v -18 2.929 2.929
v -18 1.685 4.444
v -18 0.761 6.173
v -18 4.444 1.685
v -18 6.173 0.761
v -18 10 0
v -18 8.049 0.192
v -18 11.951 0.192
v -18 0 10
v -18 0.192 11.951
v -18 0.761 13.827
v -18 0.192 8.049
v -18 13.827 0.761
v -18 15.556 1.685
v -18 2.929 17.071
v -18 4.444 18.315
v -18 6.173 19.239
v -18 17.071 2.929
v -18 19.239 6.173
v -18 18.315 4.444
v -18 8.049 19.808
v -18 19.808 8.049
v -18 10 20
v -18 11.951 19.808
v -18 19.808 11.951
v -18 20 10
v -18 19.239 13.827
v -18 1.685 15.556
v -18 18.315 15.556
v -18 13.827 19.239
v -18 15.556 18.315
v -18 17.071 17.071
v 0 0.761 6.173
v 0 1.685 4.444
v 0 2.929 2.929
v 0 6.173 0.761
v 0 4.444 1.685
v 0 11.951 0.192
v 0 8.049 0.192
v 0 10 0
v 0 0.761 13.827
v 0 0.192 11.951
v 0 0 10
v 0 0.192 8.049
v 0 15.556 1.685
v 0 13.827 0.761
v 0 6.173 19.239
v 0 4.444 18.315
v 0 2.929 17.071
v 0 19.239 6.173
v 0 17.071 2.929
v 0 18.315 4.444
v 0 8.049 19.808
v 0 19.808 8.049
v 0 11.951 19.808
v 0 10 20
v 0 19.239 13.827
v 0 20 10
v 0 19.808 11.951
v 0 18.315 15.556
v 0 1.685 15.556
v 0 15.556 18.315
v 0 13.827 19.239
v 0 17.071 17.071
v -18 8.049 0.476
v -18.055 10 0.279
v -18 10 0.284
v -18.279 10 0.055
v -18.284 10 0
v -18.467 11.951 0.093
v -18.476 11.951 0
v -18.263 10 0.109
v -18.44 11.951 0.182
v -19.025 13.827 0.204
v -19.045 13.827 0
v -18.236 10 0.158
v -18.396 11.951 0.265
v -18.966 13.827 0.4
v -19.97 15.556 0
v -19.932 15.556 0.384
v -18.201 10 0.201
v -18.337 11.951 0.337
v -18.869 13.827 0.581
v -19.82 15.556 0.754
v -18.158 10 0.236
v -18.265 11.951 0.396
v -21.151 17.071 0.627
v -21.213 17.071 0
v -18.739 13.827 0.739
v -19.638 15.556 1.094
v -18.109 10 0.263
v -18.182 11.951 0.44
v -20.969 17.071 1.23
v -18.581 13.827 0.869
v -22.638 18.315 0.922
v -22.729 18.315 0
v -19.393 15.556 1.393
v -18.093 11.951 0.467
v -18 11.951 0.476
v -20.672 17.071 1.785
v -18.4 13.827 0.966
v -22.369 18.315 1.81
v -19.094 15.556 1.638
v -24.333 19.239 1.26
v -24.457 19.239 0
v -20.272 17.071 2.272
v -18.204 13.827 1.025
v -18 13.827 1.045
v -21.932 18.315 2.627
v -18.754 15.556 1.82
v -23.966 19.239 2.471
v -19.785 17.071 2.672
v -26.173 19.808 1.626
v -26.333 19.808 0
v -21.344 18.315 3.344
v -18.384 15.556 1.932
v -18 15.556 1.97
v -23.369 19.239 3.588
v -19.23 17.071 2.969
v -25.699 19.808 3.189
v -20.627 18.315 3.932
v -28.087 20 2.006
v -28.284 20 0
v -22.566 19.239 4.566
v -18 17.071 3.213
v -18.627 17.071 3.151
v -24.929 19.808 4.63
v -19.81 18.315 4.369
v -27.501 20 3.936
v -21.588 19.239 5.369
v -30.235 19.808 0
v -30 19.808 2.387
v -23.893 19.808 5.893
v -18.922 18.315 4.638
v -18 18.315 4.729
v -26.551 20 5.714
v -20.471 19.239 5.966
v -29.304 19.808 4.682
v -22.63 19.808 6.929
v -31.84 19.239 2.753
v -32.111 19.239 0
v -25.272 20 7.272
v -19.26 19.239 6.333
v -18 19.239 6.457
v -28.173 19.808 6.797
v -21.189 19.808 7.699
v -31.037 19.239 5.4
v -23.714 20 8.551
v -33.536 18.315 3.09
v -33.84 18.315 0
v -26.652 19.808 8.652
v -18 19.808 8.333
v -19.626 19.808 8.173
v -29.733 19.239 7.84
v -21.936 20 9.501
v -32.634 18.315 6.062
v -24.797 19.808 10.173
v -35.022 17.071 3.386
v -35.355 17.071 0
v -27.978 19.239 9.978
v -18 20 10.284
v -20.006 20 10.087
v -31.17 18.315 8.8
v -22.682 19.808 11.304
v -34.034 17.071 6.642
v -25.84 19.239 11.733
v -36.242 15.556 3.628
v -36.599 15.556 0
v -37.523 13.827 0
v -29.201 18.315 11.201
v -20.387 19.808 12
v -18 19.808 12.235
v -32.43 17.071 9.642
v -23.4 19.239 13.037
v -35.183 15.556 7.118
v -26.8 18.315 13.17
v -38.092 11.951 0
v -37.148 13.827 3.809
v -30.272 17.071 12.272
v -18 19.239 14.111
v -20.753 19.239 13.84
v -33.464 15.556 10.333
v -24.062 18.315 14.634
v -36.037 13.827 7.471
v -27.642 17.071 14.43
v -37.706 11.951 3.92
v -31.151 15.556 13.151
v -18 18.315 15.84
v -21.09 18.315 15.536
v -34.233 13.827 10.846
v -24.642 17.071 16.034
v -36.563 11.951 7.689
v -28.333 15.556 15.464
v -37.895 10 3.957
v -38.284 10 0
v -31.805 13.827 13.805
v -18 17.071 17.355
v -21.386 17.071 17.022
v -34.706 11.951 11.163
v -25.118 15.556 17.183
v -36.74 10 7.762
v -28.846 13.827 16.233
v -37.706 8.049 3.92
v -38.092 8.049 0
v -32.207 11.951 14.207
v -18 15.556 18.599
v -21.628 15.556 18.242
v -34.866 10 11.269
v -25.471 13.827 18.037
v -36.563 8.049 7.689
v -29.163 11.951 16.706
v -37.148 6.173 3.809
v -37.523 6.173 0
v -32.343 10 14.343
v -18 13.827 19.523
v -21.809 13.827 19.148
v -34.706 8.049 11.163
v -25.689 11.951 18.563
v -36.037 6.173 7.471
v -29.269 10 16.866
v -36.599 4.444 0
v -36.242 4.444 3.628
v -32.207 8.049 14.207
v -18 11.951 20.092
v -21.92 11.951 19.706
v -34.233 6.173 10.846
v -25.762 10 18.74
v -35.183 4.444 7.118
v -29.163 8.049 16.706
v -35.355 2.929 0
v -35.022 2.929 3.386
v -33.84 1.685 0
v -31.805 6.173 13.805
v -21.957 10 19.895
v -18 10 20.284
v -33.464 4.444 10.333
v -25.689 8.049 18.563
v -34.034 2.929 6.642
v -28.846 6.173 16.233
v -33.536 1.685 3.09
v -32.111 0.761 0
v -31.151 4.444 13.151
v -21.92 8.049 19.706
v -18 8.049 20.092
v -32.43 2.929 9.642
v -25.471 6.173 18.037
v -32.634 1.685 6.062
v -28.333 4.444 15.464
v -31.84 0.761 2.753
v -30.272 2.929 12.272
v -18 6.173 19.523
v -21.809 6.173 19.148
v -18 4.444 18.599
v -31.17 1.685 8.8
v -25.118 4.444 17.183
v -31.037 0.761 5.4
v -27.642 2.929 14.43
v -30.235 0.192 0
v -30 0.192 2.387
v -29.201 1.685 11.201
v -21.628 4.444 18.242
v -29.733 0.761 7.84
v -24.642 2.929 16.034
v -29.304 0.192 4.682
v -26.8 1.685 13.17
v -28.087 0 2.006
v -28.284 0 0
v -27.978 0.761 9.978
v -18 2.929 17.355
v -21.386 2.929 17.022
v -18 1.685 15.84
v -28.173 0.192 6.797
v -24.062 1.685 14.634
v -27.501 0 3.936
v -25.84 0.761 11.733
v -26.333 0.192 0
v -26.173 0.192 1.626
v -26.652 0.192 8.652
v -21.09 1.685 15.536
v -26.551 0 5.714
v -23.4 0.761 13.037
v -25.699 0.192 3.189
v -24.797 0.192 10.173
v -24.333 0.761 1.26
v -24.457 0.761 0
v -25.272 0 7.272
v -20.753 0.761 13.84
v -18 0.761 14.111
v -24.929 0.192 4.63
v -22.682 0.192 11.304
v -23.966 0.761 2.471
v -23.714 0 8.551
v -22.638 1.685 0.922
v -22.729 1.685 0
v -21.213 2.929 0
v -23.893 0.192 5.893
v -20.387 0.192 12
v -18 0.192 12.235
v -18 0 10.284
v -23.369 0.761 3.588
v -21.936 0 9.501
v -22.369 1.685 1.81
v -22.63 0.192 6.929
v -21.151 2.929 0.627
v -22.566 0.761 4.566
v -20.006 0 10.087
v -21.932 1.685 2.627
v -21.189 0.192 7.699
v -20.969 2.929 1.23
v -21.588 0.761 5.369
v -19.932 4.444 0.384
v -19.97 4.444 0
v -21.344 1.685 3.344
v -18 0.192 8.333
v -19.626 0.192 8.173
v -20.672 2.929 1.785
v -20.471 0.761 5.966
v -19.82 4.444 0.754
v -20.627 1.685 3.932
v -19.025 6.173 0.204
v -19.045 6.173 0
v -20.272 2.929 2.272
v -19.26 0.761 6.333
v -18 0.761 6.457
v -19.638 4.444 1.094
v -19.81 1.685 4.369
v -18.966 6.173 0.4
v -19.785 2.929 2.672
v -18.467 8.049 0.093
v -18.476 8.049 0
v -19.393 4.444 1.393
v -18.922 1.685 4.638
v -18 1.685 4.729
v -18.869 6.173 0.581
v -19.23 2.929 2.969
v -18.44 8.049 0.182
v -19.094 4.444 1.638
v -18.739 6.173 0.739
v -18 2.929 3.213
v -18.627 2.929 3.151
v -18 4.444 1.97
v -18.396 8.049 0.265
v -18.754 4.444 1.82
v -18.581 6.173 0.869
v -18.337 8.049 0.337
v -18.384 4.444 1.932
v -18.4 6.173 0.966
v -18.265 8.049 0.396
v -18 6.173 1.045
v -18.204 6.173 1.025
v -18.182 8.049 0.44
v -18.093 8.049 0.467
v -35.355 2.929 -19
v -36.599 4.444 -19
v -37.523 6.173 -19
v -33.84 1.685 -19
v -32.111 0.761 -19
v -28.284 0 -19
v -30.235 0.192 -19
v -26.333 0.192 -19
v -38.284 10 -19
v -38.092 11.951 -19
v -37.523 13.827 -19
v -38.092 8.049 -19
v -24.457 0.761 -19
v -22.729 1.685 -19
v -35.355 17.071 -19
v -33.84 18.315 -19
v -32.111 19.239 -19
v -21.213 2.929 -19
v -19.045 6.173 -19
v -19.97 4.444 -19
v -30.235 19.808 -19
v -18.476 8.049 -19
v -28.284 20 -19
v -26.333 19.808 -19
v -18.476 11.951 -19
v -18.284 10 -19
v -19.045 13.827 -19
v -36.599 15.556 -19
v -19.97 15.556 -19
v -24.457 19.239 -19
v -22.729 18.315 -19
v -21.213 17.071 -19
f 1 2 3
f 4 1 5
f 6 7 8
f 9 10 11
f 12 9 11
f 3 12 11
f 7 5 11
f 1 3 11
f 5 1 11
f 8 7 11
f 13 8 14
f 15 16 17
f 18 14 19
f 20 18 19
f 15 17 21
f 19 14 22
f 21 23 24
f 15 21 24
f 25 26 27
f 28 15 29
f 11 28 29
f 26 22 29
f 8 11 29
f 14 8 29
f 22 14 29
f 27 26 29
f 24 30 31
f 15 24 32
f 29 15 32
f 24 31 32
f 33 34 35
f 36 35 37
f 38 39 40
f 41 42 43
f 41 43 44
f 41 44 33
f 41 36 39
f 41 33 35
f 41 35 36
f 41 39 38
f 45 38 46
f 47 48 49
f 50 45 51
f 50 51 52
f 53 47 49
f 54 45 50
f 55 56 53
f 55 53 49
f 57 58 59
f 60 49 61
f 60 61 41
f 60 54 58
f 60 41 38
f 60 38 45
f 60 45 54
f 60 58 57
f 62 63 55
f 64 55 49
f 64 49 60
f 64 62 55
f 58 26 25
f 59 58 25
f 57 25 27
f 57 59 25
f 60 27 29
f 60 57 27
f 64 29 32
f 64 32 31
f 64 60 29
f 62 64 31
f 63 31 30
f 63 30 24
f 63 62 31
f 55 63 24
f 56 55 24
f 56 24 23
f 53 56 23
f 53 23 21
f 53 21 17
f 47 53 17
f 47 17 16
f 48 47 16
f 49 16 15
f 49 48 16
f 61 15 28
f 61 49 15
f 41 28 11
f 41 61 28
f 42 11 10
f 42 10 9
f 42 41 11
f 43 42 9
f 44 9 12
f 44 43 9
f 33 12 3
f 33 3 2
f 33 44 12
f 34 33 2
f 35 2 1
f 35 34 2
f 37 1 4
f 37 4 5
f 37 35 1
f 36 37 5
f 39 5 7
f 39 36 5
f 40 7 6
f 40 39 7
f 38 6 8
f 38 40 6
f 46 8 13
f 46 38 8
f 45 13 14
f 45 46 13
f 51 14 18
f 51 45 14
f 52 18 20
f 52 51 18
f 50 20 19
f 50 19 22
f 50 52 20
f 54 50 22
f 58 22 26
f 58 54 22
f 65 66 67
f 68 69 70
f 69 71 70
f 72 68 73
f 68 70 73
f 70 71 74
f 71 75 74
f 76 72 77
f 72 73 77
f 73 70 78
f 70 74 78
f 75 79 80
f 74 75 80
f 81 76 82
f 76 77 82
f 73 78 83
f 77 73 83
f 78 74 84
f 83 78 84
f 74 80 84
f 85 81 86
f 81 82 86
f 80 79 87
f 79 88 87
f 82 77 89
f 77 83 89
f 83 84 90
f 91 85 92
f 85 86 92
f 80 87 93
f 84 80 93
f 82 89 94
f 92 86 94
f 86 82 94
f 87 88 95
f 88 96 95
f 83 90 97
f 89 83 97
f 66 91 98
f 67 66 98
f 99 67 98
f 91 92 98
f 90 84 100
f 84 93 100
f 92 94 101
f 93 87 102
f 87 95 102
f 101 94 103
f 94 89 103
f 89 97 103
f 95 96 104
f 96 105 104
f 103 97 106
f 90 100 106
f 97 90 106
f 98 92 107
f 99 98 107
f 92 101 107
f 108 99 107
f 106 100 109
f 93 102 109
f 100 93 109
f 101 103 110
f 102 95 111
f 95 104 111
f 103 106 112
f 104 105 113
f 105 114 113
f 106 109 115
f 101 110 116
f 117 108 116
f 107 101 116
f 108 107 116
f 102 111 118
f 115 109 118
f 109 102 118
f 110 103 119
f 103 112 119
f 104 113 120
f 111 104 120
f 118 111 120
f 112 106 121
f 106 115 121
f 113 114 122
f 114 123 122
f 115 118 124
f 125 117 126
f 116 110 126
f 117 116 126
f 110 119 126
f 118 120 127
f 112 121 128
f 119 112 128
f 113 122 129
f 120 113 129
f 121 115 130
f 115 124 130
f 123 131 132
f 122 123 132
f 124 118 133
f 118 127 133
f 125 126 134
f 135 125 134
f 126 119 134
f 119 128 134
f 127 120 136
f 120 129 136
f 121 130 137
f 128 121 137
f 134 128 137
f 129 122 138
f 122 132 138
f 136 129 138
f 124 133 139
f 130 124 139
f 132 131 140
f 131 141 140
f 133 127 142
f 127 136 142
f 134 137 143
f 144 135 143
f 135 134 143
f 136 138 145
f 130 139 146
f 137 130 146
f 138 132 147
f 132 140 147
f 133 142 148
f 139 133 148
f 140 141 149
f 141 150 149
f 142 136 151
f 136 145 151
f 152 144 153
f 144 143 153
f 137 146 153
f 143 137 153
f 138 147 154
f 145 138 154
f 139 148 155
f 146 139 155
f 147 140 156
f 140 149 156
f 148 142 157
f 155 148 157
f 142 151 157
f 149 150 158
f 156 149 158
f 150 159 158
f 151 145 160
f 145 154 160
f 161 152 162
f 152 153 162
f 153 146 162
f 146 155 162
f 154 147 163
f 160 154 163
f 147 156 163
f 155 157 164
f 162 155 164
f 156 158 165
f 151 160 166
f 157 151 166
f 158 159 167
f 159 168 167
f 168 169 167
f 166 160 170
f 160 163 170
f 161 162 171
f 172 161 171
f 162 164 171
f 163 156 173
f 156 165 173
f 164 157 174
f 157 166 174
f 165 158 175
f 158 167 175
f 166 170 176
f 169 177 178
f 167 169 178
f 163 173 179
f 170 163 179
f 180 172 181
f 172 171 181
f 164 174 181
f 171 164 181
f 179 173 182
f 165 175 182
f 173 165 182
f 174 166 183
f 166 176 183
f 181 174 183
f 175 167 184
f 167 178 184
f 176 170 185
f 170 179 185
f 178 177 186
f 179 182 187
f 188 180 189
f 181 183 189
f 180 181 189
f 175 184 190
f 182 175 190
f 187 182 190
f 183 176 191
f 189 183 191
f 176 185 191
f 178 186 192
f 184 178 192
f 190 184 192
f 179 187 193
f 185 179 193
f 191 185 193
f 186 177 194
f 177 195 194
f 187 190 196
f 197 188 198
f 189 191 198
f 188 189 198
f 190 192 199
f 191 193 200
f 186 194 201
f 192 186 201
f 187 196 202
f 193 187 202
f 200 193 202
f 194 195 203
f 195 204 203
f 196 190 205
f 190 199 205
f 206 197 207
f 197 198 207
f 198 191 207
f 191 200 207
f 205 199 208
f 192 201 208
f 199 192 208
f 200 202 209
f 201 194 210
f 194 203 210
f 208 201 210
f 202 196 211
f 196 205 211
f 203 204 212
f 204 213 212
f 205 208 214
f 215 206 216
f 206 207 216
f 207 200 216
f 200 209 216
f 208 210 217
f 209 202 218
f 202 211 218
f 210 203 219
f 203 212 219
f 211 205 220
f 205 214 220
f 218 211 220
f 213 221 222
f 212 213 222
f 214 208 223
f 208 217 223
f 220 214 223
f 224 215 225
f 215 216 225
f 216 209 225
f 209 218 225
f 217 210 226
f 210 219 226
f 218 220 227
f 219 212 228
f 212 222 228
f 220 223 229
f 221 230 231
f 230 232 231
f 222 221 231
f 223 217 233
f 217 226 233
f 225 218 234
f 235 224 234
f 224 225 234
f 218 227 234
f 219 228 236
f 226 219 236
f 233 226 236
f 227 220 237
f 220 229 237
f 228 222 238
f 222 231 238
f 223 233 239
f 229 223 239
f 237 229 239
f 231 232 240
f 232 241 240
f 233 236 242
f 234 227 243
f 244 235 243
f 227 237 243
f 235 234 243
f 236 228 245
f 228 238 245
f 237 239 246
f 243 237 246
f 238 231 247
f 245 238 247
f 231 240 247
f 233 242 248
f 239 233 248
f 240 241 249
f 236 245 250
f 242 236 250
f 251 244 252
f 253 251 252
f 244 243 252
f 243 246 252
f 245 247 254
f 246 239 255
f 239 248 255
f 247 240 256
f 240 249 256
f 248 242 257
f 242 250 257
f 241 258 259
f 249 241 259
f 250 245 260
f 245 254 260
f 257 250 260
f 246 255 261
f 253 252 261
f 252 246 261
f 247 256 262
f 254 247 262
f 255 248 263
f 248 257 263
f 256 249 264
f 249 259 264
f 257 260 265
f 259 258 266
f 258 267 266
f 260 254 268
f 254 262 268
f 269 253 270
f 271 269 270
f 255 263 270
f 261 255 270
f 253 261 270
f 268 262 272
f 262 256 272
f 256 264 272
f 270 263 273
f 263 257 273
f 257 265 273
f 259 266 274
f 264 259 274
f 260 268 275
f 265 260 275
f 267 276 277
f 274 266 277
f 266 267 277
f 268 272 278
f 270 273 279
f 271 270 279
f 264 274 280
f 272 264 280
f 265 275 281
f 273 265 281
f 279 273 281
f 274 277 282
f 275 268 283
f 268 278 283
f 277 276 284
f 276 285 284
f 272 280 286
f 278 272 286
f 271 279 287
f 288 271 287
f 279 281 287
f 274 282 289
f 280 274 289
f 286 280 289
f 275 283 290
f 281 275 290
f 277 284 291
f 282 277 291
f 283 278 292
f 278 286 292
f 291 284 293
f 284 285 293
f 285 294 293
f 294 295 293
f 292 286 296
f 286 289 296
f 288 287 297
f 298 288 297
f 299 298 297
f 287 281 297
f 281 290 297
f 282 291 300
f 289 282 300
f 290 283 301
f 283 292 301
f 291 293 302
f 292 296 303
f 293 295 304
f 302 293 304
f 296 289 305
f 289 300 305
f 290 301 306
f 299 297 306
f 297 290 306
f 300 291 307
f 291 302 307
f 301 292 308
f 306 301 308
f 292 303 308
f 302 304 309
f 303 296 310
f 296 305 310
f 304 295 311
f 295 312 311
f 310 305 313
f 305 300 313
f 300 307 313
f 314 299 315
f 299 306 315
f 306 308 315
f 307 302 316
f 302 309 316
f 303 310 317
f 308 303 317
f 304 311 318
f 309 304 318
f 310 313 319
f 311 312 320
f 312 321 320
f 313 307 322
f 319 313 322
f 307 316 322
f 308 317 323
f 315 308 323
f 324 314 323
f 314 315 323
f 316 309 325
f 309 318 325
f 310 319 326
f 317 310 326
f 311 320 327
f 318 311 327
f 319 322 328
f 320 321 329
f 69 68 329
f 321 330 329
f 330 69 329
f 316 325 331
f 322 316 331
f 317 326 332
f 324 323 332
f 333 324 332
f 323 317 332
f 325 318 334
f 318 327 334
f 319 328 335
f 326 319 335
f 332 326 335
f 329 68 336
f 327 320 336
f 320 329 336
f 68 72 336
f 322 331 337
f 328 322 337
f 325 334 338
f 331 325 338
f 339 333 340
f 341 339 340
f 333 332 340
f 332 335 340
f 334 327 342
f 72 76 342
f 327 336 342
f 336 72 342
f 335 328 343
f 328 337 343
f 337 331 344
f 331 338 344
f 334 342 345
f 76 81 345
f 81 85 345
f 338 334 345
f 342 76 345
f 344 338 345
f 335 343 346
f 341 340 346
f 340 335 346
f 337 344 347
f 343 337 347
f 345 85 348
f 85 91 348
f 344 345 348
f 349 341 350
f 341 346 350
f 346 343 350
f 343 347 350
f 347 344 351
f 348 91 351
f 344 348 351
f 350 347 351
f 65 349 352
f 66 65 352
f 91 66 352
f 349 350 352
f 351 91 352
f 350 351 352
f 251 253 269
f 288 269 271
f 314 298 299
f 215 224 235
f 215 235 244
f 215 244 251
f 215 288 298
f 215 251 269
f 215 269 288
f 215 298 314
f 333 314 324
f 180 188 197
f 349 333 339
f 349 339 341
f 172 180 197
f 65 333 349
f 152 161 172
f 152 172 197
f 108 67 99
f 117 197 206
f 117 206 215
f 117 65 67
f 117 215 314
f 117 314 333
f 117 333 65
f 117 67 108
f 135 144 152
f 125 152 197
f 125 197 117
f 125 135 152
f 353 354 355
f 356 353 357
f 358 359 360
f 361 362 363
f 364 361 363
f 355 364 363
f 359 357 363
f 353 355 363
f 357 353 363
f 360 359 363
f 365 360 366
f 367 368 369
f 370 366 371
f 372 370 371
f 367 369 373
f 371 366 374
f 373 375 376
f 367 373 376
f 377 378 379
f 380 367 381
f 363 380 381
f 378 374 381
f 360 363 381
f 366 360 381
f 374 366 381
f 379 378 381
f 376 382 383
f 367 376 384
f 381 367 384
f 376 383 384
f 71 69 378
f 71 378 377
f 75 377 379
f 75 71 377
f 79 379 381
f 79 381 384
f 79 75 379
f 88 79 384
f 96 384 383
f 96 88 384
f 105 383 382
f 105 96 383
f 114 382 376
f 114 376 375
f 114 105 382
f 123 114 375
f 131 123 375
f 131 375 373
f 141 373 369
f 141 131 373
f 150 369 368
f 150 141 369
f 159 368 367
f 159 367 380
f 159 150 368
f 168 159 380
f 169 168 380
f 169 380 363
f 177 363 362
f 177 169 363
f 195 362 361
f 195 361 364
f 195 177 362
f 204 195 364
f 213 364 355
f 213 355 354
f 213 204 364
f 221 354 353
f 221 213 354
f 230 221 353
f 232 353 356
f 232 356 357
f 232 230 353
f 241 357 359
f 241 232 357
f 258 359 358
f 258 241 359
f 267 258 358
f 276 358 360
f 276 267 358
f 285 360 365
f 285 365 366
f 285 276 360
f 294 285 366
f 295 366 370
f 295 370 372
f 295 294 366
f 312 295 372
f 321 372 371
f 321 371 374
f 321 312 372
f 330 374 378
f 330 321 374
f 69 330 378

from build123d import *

# Parameters (mm, degrees)
F1_R      = 10
F2_DEPTH  = 18
F0_R      = 10
F3_DEPTH  = 19
F3_FACE_R = 10
F5_ANGLE  = 90


with BuildPart() as f2:
    # F1 (on Right) → F2 (new body)
    with BuildSketch(Plane.YZ):
        with Locations((10, 10)):
            Circle(F1_R)
    extrude(amount=-F2_DEPTH)


with BuildPart() as f3:
    # F0 (on Top) → F3 (new body)
    with BuildSketch(Plane.XY):
        with Locations((-28.2842712475, 10)):
            Circle(F0_R)
    extrude(amount=-F3_DEPTH)

    # F3_face (on face) → F5 (revolve)
    with BuildSketch(Plane(origin=(-28.2842712475, 10, 0), x_dir=(1, 0, 0), z_dir=(0, 0, 1))):
        Circle(F3_FACE_R)
    revolve(axis=Axis((-18, 7.3859319091, 0), (0, 1, 0)), revolution_arc=F5_ANGLE)


solid = Compound([f2.part, f3.part])
